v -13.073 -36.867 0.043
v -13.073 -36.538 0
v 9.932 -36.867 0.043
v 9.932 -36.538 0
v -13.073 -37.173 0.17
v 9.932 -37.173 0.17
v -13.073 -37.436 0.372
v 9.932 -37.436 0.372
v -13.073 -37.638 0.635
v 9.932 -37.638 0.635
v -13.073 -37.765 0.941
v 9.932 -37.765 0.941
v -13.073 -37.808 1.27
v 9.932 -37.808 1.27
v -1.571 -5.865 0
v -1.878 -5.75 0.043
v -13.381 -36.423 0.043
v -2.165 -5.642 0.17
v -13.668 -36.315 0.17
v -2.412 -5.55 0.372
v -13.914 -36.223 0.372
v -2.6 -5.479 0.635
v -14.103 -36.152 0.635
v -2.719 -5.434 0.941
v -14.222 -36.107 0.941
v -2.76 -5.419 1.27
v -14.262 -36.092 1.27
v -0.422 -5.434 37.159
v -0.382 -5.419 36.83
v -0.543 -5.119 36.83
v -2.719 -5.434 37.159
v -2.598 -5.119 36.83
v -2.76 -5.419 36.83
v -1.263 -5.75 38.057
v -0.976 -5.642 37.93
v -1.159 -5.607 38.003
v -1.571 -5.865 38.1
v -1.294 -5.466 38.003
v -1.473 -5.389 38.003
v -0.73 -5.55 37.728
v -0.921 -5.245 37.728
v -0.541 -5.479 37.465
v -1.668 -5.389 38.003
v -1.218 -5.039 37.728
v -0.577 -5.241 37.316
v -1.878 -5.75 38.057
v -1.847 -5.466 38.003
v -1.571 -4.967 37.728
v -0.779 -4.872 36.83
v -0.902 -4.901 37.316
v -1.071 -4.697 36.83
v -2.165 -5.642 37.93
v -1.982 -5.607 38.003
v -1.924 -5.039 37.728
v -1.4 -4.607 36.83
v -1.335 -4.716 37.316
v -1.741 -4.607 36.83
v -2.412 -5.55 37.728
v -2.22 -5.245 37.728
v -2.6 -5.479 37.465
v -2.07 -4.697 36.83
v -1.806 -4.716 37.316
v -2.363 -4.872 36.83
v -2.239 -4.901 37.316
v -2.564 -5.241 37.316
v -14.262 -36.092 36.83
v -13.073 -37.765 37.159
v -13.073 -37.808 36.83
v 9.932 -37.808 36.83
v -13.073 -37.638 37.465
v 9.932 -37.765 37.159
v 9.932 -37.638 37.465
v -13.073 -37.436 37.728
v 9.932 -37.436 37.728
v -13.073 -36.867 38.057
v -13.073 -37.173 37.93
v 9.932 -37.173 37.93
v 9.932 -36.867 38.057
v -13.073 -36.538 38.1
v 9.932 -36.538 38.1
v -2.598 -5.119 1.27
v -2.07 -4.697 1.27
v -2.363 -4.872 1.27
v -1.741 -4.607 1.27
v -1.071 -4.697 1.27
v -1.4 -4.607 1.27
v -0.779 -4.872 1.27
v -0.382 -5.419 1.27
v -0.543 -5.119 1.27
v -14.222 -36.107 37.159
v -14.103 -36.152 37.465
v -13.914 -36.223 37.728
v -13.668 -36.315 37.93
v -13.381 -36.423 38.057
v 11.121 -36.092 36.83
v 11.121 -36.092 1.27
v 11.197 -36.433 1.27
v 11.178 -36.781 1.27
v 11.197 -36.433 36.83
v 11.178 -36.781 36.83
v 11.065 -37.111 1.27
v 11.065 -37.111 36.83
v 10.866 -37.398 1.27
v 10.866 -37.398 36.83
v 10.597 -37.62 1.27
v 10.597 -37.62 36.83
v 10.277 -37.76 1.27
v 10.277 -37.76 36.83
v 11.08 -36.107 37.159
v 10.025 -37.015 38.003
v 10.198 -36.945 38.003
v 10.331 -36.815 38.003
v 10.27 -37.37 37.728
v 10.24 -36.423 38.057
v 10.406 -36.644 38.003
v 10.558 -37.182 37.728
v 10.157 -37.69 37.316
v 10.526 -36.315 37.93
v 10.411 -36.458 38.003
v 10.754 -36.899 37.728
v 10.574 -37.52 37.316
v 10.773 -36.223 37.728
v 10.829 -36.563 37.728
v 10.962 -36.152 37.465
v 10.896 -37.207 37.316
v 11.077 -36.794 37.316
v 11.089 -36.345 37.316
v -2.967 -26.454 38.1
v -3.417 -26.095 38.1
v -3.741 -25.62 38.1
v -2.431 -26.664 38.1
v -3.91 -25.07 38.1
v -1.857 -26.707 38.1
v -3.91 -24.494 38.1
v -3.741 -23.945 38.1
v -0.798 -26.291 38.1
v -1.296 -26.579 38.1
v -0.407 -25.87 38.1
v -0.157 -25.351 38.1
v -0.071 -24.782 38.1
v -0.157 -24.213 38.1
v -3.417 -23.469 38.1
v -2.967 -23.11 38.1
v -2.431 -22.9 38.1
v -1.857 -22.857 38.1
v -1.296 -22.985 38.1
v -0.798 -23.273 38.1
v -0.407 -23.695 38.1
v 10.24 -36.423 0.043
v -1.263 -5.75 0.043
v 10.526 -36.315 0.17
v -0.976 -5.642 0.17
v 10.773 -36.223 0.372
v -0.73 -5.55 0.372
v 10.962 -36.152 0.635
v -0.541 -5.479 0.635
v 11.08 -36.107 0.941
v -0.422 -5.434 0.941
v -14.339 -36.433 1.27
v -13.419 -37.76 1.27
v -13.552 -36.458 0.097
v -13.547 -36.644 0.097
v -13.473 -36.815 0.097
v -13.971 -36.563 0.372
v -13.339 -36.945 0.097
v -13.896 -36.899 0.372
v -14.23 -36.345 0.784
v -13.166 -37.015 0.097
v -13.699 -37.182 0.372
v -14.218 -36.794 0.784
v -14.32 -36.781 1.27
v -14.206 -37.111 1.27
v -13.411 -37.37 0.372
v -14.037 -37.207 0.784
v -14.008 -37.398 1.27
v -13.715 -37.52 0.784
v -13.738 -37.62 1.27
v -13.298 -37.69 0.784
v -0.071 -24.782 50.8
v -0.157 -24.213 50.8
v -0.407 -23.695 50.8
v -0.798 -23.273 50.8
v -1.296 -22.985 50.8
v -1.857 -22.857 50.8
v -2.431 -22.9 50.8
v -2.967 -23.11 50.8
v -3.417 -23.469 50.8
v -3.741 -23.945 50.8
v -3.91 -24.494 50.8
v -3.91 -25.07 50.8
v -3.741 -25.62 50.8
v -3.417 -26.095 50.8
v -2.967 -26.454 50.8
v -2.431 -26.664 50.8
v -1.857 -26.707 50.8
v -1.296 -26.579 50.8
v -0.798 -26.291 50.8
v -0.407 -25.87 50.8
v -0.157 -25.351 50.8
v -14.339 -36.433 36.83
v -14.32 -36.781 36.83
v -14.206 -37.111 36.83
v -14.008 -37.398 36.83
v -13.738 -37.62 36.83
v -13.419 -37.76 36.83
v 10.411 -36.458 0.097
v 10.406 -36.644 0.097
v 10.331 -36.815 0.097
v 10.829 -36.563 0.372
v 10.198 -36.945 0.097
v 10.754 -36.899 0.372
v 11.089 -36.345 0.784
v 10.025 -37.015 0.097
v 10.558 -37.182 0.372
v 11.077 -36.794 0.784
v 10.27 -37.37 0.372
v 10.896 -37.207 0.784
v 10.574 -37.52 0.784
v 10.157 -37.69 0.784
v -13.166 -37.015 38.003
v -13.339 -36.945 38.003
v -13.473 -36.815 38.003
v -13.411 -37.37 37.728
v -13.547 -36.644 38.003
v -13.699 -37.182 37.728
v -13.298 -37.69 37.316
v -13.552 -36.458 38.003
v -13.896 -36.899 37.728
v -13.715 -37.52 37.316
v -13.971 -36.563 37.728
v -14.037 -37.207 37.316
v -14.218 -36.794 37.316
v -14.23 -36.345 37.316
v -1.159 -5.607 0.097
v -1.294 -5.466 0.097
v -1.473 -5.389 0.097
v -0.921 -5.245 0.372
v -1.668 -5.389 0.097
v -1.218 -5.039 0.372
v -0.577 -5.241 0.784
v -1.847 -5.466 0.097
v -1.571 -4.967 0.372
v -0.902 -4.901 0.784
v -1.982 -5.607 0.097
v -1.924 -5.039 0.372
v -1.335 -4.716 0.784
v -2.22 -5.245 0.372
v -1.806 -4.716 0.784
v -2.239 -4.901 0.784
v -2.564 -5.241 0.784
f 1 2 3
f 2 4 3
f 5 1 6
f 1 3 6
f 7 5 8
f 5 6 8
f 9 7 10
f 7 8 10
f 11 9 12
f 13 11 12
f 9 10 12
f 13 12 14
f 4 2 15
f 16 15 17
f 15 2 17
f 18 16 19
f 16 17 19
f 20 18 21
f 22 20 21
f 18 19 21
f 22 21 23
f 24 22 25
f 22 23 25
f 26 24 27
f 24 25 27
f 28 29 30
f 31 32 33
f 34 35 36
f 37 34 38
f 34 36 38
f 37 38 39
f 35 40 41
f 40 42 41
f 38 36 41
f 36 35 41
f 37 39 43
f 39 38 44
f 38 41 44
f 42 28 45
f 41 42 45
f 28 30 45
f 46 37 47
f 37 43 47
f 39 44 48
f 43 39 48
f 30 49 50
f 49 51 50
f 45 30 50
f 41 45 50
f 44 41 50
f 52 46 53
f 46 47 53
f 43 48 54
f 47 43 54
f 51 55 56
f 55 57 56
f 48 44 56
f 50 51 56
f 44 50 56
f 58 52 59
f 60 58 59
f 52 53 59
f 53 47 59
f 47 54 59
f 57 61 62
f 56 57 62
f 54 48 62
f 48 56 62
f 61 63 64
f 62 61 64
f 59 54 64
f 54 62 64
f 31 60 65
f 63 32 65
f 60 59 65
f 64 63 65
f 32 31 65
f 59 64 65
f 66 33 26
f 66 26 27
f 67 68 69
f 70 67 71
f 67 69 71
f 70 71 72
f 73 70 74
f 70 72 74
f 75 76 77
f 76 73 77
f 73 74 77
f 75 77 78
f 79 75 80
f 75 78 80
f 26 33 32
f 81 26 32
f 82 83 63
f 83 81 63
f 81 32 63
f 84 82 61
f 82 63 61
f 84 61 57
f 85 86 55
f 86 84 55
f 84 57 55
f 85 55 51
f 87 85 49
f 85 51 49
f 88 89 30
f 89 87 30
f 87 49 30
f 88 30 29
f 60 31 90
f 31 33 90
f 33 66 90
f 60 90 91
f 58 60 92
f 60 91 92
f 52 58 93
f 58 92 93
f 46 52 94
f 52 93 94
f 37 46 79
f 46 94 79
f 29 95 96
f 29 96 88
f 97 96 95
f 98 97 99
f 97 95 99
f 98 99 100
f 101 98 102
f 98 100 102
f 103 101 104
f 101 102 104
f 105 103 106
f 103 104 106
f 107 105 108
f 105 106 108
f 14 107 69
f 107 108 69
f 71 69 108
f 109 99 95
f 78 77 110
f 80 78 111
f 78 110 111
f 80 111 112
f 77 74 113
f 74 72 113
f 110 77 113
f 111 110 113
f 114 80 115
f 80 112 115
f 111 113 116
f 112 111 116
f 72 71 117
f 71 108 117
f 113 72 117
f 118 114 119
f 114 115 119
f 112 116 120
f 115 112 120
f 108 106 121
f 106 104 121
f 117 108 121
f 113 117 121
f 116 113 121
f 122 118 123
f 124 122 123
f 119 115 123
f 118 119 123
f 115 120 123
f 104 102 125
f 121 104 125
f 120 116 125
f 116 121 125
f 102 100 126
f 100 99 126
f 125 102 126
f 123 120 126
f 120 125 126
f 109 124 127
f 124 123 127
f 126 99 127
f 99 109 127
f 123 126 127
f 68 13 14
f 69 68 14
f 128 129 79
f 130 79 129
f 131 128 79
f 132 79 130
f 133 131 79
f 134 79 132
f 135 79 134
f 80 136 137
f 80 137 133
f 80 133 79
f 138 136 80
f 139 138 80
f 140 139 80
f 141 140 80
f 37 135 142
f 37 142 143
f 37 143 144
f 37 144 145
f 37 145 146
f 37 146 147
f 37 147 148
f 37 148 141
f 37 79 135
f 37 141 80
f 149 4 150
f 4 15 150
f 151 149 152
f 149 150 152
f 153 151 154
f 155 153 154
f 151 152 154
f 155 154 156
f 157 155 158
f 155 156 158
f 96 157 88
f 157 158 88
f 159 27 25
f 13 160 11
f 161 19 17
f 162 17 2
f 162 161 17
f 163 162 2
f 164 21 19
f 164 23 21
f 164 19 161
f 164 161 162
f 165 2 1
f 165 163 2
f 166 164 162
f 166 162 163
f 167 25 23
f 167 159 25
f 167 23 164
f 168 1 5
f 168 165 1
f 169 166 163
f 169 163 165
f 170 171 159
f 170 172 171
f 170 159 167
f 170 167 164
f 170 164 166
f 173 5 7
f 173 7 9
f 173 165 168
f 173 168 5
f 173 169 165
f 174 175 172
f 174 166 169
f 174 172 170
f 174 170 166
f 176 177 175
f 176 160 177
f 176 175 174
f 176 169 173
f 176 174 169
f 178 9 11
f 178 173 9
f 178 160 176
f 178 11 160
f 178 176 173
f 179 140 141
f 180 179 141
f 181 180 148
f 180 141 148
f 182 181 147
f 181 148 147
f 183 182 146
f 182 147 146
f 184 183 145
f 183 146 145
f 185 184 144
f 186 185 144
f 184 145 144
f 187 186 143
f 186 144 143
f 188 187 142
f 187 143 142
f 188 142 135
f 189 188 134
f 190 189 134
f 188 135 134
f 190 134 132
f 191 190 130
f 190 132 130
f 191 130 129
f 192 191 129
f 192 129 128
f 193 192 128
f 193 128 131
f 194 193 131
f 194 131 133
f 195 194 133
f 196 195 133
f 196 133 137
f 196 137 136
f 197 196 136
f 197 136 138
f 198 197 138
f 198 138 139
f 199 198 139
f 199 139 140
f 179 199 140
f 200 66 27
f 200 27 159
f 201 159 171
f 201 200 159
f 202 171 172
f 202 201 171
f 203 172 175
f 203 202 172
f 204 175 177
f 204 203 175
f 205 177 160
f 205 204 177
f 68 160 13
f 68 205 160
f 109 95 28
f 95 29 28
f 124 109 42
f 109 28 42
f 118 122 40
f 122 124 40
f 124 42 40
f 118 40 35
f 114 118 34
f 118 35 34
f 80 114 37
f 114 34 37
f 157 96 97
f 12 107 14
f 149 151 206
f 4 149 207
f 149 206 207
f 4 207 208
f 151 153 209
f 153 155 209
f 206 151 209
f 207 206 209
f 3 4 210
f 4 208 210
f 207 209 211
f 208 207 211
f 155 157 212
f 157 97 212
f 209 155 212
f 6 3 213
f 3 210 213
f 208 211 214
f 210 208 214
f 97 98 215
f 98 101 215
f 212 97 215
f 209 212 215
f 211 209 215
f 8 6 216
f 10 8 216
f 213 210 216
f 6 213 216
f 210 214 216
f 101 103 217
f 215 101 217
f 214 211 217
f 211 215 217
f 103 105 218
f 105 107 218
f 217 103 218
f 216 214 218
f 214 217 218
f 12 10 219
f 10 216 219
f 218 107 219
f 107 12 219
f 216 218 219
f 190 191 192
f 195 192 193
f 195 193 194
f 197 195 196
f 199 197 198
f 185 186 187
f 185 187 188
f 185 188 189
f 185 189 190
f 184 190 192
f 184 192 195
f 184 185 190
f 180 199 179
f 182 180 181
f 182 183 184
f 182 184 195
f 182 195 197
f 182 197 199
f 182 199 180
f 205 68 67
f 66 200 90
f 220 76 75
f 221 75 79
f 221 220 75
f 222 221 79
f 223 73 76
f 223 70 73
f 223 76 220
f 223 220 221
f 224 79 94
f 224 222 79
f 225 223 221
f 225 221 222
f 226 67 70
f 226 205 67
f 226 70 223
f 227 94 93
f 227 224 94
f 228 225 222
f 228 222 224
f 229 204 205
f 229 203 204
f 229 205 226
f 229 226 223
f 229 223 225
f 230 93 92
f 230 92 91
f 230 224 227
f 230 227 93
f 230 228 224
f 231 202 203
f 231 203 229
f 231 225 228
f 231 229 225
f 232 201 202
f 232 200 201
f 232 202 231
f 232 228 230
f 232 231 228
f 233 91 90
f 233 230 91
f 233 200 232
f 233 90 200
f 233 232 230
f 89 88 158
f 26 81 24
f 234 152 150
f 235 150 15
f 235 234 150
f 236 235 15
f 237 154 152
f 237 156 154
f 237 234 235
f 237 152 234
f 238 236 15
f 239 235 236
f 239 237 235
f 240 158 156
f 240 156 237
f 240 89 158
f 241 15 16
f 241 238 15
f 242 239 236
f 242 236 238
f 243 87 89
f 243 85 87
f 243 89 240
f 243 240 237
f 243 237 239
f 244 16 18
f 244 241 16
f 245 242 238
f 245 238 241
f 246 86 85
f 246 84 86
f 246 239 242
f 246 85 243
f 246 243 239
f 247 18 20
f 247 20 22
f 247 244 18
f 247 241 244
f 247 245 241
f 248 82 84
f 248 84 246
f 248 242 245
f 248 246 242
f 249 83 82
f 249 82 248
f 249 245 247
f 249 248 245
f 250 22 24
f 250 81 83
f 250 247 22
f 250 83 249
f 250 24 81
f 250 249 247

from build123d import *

# Parameters (mm, degrees)
F1_DEPTH = 38.1
F2_R     = 1.9304
F3_DEPTH = 50.8
F4_R     = 1.27


with BuildPart() as f1:
    # F0 (on Top) → F1 (new body)
    with BuildSketch(Plane.XY):
        Polygon((-1.570657, -2.248221), (-14.905657, -37.808221), (11.764343, -37.808221), align=None)
    extrude(amount=F1_DEPTH)

    # F2 (on Top) → F3 (join)
    with BuildSketch(Plane.XY):
        with Locations((-2.001594, -24.78213)):
            Circle(F2_R)
    extrude(amount=F3_DEPTH)

    # F4
    f4_edges = [f1.edges().sort_by_distance(p)[0] for p in [
        (-1.570657, -2.248221, 19.05),
        (11.764343, -37.808221, 19.05),
        (-14.905657, -37.808221, 19.05),
        (-1.570657, -37.808221, 38.1),
        (5.096843, -20.028221, 38.1),
        (-8.238157, -20.028221, 38.1),
        (5.096843, -20.028221, 0),
        (-8.238157, -20.028221, 0),
        (-1.570657, -37.808221, 0),
    ]]
    fillet(f4_edges, radius=F4_R)


solid = f1.part
